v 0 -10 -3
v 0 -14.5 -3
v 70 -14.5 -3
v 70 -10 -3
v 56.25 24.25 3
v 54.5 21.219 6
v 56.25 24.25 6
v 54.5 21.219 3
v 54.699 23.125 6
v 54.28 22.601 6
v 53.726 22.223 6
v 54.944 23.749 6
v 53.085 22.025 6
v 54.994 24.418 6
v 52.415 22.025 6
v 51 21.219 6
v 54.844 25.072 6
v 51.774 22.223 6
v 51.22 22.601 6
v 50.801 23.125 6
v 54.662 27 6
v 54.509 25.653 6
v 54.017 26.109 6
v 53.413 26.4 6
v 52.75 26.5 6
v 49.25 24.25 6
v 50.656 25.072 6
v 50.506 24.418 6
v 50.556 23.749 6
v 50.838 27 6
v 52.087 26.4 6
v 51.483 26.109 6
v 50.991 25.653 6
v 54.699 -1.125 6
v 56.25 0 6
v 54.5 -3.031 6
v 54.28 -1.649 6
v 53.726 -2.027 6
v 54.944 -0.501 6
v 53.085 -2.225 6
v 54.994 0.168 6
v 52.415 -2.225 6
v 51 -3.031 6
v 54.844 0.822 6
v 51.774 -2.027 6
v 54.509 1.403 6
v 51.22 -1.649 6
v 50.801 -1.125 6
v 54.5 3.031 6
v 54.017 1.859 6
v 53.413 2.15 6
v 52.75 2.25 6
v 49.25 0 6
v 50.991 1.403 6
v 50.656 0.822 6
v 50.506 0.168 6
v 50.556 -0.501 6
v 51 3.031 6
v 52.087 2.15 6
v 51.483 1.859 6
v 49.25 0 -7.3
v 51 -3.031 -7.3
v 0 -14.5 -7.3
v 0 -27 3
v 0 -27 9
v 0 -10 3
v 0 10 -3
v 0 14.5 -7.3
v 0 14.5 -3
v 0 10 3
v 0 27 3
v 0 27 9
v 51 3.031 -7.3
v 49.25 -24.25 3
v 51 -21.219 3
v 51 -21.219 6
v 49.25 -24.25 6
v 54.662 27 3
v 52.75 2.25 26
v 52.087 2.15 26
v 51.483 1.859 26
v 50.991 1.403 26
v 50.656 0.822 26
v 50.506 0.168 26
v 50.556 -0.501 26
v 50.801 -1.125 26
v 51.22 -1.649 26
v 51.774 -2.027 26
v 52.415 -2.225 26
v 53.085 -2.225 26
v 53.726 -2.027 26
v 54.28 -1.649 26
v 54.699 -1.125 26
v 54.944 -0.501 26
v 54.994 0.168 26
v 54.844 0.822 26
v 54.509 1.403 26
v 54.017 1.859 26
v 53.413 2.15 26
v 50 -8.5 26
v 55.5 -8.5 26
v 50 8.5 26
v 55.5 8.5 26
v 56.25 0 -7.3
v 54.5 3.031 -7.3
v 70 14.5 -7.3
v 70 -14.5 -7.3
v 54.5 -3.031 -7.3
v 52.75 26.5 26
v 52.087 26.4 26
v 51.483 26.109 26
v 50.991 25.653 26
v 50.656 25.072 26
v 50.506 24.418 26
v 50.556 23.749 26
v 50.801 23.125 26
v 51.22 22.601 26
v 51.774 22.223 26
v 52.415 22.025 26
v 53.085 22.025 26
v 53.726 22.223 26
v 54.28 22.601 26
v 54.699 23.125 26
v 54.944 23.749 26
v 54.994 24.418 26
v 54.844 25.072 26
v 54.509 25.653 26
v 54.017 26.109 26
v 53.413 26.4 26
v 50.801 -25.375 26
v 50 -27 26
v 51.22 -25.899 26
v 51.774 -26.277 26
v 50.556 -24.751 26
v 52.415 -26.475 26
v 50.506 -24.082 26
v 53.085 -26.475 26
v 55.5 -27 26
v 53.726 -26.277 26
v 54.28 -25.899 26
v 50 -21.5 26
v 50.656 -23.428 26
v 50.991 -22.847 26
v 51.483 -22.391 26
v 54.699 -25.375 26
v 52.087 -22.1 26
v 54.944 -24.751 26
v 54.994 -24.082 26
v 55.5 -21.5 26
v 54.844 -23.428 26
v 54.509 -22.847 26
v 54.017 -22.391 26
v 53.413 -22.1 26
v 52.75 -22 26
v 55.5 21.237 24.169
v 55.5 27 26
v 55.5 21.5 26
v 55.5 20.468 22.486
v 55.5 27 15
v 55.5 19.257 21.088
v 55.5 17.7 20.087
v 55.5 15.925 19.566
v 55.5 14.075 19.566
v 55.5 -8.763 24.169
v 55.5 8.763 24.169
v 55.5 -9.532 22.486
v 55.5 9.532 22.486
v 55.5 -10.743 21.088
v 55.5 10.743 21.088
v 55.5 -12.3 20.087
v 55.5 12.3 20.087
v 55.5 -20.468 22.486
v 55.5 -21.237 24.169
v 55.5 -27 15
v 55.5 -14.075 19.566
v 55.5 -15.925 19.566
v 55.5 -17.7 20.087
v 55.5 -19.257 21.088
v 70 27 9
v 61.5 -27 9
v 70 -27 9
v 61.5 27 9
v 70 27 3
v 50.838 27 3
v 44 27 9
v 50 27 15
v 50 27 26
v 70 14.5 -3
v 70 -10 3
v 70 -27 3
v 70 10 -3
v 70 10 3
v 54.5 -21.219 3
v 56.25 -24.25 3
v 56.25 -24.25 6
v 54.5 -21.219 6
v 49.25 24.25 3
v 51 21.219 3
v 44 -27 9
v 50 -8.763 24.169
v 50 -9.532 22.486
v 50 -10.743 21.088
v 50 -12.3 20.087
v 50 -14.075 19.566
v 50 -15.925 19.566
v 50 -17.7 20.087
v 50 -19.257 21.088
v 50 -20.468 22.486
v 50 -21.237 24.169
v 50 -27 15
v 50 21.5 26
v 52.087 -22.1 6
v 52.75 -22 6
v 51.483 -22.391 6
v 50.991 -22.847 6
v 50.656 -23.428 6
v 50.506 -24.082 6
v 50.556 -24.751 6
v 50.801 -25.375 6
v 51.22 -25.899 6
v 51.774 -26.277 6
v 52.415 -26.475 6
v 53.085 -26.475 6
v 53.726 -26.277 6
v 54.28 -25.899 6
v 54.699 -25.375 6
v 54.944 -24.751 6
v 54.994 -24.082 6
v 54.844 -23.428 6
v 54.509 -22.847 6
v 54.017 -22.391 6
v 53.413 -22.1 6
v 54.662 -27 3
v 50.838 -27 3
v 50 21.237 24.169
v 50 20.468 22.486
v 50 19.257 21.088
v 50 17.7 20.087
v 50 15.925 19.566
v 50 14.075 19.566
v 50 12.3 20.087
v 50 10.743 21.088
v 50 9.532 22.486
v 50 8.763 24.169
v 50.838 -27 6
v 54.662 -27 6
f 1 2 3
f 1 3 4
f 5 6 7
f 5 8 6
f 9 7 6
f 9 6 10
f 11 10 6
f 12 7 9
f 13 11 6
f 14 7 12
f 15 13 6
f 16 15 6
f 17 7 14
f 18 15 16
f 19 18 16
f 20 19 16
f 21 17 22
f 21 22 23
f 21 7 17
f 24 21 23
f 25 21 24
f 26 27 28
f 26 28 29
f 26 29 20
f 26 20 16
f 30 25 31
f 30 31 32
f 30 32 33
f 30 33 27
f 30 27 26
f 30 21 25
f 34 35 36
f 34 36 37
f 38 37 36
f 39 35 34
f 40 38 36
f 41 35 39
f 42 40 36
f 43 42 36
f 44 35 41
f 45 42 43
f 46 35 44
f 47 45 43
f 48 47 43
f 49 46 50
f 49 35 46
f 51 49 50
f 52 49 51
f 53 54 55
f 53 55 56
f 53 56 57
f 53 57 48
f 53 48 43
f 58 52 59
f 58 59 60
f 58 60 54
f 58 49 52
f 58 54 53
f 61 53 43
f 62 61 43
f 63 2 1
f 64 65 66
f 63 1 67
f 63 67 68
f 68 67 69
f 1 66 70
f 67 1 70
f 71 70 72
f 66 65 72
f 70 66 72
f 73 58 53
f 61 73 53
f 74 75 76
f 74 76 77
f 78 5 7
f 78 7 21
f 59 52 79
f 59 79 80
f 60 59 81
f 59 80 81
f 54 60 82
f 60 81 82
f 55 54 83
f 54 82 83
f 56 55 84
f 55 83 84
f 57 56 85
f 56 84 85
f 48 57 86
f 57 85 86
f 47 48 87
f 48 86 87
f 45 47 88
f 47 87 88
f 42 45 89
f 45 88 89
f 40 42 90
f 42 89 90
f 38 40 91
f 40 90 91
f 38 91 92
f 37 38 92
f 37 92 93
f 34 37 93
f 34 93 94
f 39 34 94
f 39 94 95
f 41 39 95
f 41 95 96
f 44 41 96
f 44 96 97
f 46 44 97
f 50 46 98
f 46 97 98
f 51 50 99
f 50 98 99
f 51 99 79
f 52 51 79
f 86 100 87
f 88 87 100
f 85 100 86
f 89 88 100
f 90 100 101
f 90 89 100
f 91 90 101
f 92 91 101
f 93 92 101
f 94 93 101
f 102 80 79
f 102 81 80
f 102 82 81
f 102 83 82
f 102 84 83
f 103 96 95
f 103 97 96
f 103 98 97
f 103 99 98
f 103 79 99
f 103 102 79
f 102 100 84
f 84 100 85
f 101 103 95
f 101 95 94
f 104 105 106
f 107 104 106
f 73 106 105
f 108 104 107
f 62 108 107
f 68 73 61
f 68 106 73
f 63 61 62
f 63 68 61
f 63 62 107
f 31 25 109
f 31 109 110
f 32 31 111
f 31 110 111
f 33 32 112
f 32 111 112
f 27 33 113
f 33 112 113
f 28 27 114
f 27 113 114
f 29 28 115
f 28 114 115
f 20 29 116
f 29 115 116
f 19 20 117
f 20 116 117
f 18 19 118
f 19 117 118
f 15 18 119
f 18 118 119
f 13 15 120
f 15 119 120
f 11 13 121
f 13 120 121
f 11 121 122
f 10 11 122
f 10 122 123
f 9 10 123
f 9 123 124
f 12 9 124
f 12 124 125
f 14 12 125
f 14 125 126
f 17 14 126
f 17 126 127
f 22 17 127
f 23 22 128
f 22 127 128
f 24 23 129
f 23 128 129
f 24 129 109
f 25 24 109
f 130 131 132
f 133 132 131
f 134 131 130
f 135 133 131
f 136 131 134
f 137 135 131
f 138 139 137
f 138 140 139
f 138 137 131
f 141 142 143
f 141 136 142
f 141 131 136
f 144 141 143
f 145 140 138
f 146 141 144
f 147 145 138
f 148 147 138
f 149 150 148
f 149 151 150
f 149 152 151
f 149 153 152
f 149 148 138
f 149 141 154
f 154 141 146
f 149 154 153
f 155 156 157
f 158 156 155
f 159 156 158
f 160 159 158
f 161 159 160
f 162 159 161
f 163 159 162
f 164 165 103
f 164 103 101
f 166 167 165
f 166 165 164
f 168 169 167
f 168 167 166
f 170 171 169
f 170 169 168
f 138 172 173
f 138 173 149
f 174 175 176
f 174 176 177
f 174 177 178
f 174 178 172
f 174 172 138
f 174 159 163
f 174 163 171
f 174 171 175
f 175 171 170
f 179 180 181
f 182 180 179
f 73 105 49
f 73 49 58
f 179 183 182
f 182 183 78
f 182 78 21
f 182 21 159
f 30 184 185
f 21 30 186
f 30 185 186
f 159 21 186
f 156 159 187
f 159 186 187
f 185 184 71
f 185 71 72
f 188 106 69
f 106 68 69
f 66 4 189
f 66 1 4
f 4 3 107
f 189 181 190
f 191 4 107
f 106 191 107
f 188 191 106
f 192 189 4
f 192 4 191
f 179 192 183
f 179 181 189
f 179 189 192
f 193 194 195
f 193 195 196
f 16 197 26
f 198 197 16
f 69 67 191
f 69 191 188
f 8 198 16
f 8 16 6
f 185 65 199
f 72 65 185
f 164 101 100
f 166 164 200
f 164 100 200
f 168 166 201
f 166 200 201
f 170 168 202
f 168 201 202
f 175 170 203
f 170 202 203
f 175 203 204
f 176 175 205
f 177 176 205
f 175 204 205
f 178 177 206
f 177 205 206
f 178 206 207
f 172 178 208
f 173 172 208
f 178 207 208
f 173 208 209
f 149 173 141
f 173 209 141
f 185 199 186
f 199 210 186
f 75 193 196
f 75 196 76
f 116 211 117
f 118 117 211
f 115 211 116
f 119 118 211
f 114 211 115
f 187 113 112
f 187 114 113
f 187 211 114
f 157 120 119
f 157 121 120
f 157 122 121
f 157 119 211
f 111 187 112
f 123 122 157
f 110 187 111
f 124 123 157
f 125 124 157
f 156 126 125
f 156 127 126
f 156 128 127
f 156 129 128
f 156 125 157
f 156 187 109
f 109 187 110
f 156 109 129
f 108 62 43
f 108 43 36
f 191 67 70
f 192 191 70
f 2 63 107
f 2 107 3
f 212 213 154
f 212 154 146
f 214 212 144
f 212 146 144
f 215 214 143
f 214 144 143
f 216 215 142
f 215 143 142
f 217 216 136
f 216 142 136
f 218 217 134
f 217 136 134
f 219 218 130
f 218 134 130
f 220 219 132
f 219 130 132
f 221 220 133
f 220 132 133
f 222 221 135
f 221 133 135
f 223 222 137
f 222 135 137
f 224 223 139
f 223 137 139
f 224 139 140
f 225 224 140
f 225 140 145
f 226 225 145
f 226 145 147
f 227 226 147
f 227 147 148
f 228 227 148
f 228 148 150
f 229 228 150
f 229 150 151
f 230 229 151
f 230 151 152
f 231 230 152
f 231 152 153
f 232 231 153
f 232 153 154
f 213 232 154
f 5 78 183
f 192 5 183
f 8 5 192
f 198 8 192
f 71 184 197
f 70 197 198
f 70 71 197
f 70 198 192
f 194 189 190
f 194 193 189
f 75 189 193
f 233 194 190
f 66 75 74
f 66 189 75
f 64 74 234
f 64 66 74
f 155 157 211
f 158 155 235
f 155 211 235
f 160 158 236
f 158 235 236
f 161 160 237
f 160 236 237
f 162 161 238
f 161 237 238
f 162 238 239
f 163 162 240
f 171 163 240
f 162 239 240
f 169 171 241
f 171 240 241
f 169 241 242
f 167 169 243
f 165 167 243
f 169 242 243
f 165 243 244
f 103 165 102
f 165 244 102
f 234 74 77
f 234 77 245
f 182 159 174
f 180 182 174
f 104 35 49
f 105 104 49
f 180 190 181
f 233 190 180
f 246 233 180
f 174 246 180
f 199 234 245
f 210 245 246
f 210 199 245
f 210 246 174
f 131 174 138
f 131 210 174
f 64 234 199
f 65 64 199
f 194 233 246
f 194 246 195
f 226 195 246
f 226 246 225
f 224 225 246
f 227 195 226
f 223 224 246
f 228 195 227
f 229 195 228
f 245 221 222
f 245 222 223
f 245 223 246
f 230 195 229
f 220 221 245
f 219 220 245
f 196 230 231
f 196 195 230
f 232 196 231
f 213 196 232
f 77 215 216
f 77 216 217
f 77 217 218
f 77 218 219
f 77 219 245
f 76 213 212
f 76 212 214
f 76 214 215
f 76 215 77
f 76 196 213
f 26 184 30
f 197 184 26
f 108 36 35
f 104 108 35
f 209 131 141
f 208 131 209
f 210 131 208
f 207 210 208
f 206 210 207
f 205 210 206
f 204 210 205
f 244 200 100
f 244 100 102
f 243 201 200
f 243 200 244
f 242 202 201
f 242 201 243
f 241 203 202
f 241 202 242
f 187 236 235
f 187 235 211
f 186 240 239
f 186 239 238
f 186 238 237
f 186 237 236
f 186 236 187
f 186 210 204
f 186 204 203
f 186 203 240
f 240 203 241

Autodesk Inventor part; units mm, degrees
ref_plane "YZ Plane" through (0, 0, 0) normal (1, 0, 0) x (0, 1, 0)
ref_plane "XZ Plane" through (0, 0, 0) normal (0, 1, 0) x (-1, 0, 0)
ref_plane "XY Plane" through (0, 0, 0) normal (0, 0, 1) x (1, 0, 0)
sketch "Sketch2" plane through (0, 0, 0) normal (1, 0, 0) x (0, 1, 0)
  line L0 (-19.9252, 0) -> (19.9252, 0)
  line L1 (0, -28.9507) -> (0, 28.9507)
  line L2 (14.5, -7.3) -> (-14.5, -7.3)
  line L3 (-14.5, -7.3) -> (-14.5, -3)
  line L4 (-10, -3) -> (-10, 3)
  line L5 (-27, 3) -> (-27, 9)
  line L6 (-27, 9) -> (27, 9)
  line L7 (14.5, -7.3) -> (14.5, -3)
  line L8 (10, -3) -> (10, 3)
  line L9 (27, 3) -> (27, 9)
  line L10 (-14.5, -3) -> (-10, -3)
  line L11 (10, -3) -> (14.5, -3)
  line L12 (27, 3) -> (10, 3)
  line L13 (-10, 3) -> (-27, 3)
  point P0 (0, 0)
  point P1 (0, 0)
  point P2 (10, 0)
  dimension "d4" = 14.5
  dimension "d8" = 27
  dimension "d9" = 10
  dimension "d10" = 4.3
  dimension "d11" = 6
  dimension "d12" = 6
extrude "Extrusion2" add sketch "Sketch2" along normal blind 70
sketch "Sketch3" plane through (0, -27, 9) normal (0, 0, 1) x (1, 0, 0)
  line L0 (0, 0) -> (70, 0) projected
  line L1 (0, 54) -> (70, 54) projected
  line L2 (55.5, 0) -> (50, 0)
  line L3 (50, 0) -> (50, 54)
  line L4 (50, 54) -> (55.5, 54)
  line L5 (55.5, 54) -> (55.5, 0)
  line L6 (70, 54) -> (70, 0) projected
  point P0 (0, 27)
  dimension "d15" = 20
  dimension "d16" = 5.5
extrude "Extrusion3" add sketch "Sketch3" along normal blind 17 contours L3 L1 L5 L0
sketch "Sketch4" plane through (50, -27, 9) normal (-1, 0, 0) x (0, 0, 1)
  line L0 (17, 54) -> (17, 0) projected
  circle A0 centre (17, 42) radius 6.5
  circle A1 centre (17, 12) radius 6.5
  line L1 (0, 0) -> (17, 0) projected
  point P0 (-9, 27)
  dimension "d19" = 13
  dimension "d20" = 13
  dimension "d21" = 30
  dimension "d22" = 12
extrude "Extrusion4" cut sketch "Sketch4" against normal up to surface (5.5 mm away)
sketch "Sketch5" plane through (0, -14.5, -7.3) normal (0, 0, -1) x (-1, 0, 0)
  line L0 (0, 0) -> (-70, 0)
  line L1 (-55.5, 29) -> (-55.5, 0)
  line L2 (-50, 0) -> (-50, 29)
  line L3 (-50, 14.5) -> (-55.5, 14.5)
  line L4 (-50, -12.5) -> (-50, 41.5) projected
  line L5 (-55.5, 41.5) -> (-55.5, -12.5) projected
  line L6 (0, -12.5) -> (-70, -12.5) projected
  point P0 (0, 27)
  point P1 (-52.75, -9.75)
  point P2 (-52.75, 14.5)
  point P3 (-52.75, 38.75)
  dimension "d26" = 2.75
  dimension "d34" = 2.75
hole "Hole1" at (52.75, -24.25, -7.3) at (52.75, 0, -7.3) at (52.75, 24.25, -7.3) direction (0, 0, 1) diameter 4.5 end through all
sketch "Sketch6" plane through (0, -14.5, -7.3) normal (0, 0, -1) x (-1, 0, 0)
  circle A0 centre (-52.75, 14.5) radius 2.25 projected
  line L0 (-56.25, 14.5) -> (-54.5, 17.5311)
  line L1 (-54.5, 17.5311) -> (-51, 17.5311)
  line L2 (-51, 17.5311) -> (-49.25, 14.5)
  line L3 (-49.25, 14.5) -> (-51, 11.4689)
  line L4 (-51, 11.4689) -> (-54.5, 11.4689)
  line L5 (-54.5, 11.4689) -> (-56.25, 14.5)
  circle A1 centre (-52.75, 38.75) radius 2.25 projected
  line L6 (-56.25, 38.75) -> (-54.5, 41.7811)
  line L7 (-54.5, 41.7811) -> (-51, 41.7811)
  line L8 (-51, 41.7811) -> (-49.25, 38.75)
  line L9 (-49.25, 38.75) -> (-51, 35.7189)
  line L10 (-51, 35.7189) -> (-54.5, 35.7189)
  line L11 (-54.5, 35.7189) -> (-56.25, 38.75)
  circle A2 centre (-52.75, -9.75) radius 2.25 projected
  line L12 (-56.25, -9.75) -> (-54.5, -6.7189)
  line L13 (-54.5, -6.7189) -> (-51, -6.7189)
  line L14 (-51, -6.7189) -> (-49.25, -9.75)
  line L15 (-49.25, -9.75) -> (-51, -12.7811)
  line L16 (-51, -12.7811) -> (-54.5, -12.7811)
  line L17 (-54.5, -12.7811) -> (-56.25, -9.75)
  point P0 (0, 14.5)
  dimension "d35" = 7
  dimension "d36" = 7
  dimension "d37" = 7
extrude "Extrusion5" cut sketch "Sketch6" against normal blind 13.3
chamfer "Chamfer1" distance 6 angle 45 2 edges at (50, 0, 9) (55.5, 0, 9)
equation "\"d23\" = d21"
properties part number "CarroXY - Hotend"
